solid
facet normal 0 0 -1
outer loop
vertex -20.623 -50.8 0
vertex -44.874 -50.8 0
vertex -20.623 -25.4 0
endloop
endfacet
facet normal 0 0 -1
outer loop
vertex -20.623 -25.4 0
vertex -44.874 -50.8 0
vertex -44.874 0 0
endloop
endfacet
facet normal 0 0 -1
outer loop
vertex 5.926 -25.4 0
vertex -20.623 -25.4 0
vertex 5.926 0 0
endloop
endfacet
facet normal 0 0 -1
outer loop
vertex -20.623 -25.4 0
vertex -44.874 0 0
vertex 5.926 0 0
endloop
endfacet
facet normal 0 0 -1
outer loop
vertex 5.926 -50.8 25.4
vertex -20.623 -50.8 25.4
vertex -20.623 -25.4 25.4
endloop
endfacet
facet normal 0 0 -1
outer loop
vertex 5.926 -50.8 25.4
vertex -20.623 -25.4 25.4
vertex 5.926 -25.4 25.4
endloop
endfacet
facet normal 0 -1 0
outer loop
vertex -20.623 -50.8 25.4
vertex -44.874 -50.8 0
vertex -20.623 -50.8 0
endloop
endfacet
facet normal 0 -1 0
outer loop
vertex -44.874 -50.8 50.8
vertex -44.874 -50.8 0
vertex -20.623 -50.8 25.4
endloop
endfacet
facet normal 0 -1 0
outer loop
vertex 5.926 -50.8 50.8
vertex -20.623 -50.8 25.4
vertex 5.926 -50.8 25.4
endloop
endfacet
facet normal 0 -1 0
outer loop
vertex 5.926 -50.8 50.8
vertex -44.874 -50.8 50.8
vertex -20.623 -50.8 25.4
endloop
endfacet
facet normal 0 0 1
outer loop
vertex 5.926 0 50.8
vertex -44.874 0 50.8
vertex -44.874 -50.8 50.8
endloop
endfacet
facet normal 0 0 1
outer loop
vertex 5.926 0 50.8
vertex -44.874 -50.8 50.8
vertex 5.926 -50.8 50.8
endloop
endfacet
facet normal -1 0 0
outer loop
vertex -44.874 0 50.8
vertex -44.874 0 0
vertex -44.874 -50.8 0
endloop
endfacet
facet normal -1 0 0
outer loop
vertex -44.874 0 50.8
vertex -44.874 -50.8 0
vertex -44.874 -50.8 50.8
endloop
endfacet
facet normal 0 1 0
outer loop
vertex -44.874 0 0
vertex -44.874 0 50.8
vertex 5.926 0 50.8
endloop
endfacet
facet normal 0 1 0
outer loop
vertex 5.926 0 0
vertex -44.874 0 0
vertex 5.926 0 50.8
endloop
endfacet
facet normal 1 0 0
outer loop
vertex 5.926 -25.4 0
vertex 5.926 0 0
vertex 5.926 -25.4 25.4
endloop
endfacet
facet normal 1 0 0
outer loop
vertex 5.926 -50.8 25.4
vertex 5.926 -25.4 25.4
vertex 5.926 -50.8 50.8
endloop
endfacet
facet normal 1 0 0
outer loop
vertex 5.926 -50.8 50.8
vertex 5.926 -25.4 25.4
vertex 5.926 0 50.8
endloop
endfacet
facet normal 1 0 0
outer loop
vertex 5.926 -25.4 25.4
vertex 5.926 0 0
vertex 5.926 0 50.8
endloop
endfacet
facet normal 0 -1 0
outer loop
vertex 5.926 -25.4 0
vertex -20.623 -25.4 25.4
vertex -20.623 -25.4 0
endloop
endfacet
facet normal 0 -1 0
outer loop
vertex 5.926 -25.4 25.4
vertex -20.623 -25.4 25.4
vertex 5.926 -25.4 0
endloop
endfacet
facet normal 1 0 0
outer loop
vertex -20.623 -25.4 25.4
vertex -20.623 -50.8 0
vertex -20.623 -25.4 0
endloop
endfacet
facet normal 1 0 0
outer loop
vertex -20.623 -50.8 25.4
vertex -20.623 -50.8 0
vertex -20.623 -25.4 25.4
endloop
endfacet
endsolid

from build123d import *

# Parameters (mm, degrees)
F0_W     = 50.8
F0_H     = 50.8
F1_DEPTH = 50.8
F2_W     = 25.4
F2_H     = 25.4
F3_DEPTH = 50.8
F4_W     = 25.4
F4_H     = 25.4
F5_DEPTH = 101.6
F6_W     = 26.5487587631
F6_H     = 25.4
F7_DEPTH = 25.4


with BuildPart() as f1:
    # F0 (on Front) → F1 (new body)
    with BuildSketch(Plane.XZ):
        with Locations((-19.4743440211, 25.4)):
            Rectangle(F0_W, F0_H)
    extrude(amount=F1_DEPTH)

    # F2 (on Top) → F3 (cut)
    with BuildSketch(Plane.XY):
        with Locations((-32.7472079873, -12.7)):
            Rectangle(F2_W, F2_H)
        with Locations((-32.7472079873, -38.1)):
            Rectangle(F2_W, F2_H)
        with Locations((-7.3472079873, -38.1)):
            Rectangle(F2_W, F2_H)
    extrude(amount=-F3_DEPTH, mode=Mode.SUBTRACT)

    # F4 (on Top) → F5 (cut)
    with BuildSketch(Plane.XY):
        with Locations((-12.7, -17.0889281064)):
            Rectangle(F4_W, F4_H)
    extrude(amount=-F5_DEPTH, mode=Mode.SUBTRACT)

    # F6 (on face) → F7 (cut)
    with BuildSketch(Plane.XZ.offset(50.8)):
        with Locations((-7.3487234026, 12.7)):
            Rectangle(F6_W, F6_H)
    extrude(amount=-F7_DEPTH, mode=Mode.SUBTRACT)


solid = f1.part
